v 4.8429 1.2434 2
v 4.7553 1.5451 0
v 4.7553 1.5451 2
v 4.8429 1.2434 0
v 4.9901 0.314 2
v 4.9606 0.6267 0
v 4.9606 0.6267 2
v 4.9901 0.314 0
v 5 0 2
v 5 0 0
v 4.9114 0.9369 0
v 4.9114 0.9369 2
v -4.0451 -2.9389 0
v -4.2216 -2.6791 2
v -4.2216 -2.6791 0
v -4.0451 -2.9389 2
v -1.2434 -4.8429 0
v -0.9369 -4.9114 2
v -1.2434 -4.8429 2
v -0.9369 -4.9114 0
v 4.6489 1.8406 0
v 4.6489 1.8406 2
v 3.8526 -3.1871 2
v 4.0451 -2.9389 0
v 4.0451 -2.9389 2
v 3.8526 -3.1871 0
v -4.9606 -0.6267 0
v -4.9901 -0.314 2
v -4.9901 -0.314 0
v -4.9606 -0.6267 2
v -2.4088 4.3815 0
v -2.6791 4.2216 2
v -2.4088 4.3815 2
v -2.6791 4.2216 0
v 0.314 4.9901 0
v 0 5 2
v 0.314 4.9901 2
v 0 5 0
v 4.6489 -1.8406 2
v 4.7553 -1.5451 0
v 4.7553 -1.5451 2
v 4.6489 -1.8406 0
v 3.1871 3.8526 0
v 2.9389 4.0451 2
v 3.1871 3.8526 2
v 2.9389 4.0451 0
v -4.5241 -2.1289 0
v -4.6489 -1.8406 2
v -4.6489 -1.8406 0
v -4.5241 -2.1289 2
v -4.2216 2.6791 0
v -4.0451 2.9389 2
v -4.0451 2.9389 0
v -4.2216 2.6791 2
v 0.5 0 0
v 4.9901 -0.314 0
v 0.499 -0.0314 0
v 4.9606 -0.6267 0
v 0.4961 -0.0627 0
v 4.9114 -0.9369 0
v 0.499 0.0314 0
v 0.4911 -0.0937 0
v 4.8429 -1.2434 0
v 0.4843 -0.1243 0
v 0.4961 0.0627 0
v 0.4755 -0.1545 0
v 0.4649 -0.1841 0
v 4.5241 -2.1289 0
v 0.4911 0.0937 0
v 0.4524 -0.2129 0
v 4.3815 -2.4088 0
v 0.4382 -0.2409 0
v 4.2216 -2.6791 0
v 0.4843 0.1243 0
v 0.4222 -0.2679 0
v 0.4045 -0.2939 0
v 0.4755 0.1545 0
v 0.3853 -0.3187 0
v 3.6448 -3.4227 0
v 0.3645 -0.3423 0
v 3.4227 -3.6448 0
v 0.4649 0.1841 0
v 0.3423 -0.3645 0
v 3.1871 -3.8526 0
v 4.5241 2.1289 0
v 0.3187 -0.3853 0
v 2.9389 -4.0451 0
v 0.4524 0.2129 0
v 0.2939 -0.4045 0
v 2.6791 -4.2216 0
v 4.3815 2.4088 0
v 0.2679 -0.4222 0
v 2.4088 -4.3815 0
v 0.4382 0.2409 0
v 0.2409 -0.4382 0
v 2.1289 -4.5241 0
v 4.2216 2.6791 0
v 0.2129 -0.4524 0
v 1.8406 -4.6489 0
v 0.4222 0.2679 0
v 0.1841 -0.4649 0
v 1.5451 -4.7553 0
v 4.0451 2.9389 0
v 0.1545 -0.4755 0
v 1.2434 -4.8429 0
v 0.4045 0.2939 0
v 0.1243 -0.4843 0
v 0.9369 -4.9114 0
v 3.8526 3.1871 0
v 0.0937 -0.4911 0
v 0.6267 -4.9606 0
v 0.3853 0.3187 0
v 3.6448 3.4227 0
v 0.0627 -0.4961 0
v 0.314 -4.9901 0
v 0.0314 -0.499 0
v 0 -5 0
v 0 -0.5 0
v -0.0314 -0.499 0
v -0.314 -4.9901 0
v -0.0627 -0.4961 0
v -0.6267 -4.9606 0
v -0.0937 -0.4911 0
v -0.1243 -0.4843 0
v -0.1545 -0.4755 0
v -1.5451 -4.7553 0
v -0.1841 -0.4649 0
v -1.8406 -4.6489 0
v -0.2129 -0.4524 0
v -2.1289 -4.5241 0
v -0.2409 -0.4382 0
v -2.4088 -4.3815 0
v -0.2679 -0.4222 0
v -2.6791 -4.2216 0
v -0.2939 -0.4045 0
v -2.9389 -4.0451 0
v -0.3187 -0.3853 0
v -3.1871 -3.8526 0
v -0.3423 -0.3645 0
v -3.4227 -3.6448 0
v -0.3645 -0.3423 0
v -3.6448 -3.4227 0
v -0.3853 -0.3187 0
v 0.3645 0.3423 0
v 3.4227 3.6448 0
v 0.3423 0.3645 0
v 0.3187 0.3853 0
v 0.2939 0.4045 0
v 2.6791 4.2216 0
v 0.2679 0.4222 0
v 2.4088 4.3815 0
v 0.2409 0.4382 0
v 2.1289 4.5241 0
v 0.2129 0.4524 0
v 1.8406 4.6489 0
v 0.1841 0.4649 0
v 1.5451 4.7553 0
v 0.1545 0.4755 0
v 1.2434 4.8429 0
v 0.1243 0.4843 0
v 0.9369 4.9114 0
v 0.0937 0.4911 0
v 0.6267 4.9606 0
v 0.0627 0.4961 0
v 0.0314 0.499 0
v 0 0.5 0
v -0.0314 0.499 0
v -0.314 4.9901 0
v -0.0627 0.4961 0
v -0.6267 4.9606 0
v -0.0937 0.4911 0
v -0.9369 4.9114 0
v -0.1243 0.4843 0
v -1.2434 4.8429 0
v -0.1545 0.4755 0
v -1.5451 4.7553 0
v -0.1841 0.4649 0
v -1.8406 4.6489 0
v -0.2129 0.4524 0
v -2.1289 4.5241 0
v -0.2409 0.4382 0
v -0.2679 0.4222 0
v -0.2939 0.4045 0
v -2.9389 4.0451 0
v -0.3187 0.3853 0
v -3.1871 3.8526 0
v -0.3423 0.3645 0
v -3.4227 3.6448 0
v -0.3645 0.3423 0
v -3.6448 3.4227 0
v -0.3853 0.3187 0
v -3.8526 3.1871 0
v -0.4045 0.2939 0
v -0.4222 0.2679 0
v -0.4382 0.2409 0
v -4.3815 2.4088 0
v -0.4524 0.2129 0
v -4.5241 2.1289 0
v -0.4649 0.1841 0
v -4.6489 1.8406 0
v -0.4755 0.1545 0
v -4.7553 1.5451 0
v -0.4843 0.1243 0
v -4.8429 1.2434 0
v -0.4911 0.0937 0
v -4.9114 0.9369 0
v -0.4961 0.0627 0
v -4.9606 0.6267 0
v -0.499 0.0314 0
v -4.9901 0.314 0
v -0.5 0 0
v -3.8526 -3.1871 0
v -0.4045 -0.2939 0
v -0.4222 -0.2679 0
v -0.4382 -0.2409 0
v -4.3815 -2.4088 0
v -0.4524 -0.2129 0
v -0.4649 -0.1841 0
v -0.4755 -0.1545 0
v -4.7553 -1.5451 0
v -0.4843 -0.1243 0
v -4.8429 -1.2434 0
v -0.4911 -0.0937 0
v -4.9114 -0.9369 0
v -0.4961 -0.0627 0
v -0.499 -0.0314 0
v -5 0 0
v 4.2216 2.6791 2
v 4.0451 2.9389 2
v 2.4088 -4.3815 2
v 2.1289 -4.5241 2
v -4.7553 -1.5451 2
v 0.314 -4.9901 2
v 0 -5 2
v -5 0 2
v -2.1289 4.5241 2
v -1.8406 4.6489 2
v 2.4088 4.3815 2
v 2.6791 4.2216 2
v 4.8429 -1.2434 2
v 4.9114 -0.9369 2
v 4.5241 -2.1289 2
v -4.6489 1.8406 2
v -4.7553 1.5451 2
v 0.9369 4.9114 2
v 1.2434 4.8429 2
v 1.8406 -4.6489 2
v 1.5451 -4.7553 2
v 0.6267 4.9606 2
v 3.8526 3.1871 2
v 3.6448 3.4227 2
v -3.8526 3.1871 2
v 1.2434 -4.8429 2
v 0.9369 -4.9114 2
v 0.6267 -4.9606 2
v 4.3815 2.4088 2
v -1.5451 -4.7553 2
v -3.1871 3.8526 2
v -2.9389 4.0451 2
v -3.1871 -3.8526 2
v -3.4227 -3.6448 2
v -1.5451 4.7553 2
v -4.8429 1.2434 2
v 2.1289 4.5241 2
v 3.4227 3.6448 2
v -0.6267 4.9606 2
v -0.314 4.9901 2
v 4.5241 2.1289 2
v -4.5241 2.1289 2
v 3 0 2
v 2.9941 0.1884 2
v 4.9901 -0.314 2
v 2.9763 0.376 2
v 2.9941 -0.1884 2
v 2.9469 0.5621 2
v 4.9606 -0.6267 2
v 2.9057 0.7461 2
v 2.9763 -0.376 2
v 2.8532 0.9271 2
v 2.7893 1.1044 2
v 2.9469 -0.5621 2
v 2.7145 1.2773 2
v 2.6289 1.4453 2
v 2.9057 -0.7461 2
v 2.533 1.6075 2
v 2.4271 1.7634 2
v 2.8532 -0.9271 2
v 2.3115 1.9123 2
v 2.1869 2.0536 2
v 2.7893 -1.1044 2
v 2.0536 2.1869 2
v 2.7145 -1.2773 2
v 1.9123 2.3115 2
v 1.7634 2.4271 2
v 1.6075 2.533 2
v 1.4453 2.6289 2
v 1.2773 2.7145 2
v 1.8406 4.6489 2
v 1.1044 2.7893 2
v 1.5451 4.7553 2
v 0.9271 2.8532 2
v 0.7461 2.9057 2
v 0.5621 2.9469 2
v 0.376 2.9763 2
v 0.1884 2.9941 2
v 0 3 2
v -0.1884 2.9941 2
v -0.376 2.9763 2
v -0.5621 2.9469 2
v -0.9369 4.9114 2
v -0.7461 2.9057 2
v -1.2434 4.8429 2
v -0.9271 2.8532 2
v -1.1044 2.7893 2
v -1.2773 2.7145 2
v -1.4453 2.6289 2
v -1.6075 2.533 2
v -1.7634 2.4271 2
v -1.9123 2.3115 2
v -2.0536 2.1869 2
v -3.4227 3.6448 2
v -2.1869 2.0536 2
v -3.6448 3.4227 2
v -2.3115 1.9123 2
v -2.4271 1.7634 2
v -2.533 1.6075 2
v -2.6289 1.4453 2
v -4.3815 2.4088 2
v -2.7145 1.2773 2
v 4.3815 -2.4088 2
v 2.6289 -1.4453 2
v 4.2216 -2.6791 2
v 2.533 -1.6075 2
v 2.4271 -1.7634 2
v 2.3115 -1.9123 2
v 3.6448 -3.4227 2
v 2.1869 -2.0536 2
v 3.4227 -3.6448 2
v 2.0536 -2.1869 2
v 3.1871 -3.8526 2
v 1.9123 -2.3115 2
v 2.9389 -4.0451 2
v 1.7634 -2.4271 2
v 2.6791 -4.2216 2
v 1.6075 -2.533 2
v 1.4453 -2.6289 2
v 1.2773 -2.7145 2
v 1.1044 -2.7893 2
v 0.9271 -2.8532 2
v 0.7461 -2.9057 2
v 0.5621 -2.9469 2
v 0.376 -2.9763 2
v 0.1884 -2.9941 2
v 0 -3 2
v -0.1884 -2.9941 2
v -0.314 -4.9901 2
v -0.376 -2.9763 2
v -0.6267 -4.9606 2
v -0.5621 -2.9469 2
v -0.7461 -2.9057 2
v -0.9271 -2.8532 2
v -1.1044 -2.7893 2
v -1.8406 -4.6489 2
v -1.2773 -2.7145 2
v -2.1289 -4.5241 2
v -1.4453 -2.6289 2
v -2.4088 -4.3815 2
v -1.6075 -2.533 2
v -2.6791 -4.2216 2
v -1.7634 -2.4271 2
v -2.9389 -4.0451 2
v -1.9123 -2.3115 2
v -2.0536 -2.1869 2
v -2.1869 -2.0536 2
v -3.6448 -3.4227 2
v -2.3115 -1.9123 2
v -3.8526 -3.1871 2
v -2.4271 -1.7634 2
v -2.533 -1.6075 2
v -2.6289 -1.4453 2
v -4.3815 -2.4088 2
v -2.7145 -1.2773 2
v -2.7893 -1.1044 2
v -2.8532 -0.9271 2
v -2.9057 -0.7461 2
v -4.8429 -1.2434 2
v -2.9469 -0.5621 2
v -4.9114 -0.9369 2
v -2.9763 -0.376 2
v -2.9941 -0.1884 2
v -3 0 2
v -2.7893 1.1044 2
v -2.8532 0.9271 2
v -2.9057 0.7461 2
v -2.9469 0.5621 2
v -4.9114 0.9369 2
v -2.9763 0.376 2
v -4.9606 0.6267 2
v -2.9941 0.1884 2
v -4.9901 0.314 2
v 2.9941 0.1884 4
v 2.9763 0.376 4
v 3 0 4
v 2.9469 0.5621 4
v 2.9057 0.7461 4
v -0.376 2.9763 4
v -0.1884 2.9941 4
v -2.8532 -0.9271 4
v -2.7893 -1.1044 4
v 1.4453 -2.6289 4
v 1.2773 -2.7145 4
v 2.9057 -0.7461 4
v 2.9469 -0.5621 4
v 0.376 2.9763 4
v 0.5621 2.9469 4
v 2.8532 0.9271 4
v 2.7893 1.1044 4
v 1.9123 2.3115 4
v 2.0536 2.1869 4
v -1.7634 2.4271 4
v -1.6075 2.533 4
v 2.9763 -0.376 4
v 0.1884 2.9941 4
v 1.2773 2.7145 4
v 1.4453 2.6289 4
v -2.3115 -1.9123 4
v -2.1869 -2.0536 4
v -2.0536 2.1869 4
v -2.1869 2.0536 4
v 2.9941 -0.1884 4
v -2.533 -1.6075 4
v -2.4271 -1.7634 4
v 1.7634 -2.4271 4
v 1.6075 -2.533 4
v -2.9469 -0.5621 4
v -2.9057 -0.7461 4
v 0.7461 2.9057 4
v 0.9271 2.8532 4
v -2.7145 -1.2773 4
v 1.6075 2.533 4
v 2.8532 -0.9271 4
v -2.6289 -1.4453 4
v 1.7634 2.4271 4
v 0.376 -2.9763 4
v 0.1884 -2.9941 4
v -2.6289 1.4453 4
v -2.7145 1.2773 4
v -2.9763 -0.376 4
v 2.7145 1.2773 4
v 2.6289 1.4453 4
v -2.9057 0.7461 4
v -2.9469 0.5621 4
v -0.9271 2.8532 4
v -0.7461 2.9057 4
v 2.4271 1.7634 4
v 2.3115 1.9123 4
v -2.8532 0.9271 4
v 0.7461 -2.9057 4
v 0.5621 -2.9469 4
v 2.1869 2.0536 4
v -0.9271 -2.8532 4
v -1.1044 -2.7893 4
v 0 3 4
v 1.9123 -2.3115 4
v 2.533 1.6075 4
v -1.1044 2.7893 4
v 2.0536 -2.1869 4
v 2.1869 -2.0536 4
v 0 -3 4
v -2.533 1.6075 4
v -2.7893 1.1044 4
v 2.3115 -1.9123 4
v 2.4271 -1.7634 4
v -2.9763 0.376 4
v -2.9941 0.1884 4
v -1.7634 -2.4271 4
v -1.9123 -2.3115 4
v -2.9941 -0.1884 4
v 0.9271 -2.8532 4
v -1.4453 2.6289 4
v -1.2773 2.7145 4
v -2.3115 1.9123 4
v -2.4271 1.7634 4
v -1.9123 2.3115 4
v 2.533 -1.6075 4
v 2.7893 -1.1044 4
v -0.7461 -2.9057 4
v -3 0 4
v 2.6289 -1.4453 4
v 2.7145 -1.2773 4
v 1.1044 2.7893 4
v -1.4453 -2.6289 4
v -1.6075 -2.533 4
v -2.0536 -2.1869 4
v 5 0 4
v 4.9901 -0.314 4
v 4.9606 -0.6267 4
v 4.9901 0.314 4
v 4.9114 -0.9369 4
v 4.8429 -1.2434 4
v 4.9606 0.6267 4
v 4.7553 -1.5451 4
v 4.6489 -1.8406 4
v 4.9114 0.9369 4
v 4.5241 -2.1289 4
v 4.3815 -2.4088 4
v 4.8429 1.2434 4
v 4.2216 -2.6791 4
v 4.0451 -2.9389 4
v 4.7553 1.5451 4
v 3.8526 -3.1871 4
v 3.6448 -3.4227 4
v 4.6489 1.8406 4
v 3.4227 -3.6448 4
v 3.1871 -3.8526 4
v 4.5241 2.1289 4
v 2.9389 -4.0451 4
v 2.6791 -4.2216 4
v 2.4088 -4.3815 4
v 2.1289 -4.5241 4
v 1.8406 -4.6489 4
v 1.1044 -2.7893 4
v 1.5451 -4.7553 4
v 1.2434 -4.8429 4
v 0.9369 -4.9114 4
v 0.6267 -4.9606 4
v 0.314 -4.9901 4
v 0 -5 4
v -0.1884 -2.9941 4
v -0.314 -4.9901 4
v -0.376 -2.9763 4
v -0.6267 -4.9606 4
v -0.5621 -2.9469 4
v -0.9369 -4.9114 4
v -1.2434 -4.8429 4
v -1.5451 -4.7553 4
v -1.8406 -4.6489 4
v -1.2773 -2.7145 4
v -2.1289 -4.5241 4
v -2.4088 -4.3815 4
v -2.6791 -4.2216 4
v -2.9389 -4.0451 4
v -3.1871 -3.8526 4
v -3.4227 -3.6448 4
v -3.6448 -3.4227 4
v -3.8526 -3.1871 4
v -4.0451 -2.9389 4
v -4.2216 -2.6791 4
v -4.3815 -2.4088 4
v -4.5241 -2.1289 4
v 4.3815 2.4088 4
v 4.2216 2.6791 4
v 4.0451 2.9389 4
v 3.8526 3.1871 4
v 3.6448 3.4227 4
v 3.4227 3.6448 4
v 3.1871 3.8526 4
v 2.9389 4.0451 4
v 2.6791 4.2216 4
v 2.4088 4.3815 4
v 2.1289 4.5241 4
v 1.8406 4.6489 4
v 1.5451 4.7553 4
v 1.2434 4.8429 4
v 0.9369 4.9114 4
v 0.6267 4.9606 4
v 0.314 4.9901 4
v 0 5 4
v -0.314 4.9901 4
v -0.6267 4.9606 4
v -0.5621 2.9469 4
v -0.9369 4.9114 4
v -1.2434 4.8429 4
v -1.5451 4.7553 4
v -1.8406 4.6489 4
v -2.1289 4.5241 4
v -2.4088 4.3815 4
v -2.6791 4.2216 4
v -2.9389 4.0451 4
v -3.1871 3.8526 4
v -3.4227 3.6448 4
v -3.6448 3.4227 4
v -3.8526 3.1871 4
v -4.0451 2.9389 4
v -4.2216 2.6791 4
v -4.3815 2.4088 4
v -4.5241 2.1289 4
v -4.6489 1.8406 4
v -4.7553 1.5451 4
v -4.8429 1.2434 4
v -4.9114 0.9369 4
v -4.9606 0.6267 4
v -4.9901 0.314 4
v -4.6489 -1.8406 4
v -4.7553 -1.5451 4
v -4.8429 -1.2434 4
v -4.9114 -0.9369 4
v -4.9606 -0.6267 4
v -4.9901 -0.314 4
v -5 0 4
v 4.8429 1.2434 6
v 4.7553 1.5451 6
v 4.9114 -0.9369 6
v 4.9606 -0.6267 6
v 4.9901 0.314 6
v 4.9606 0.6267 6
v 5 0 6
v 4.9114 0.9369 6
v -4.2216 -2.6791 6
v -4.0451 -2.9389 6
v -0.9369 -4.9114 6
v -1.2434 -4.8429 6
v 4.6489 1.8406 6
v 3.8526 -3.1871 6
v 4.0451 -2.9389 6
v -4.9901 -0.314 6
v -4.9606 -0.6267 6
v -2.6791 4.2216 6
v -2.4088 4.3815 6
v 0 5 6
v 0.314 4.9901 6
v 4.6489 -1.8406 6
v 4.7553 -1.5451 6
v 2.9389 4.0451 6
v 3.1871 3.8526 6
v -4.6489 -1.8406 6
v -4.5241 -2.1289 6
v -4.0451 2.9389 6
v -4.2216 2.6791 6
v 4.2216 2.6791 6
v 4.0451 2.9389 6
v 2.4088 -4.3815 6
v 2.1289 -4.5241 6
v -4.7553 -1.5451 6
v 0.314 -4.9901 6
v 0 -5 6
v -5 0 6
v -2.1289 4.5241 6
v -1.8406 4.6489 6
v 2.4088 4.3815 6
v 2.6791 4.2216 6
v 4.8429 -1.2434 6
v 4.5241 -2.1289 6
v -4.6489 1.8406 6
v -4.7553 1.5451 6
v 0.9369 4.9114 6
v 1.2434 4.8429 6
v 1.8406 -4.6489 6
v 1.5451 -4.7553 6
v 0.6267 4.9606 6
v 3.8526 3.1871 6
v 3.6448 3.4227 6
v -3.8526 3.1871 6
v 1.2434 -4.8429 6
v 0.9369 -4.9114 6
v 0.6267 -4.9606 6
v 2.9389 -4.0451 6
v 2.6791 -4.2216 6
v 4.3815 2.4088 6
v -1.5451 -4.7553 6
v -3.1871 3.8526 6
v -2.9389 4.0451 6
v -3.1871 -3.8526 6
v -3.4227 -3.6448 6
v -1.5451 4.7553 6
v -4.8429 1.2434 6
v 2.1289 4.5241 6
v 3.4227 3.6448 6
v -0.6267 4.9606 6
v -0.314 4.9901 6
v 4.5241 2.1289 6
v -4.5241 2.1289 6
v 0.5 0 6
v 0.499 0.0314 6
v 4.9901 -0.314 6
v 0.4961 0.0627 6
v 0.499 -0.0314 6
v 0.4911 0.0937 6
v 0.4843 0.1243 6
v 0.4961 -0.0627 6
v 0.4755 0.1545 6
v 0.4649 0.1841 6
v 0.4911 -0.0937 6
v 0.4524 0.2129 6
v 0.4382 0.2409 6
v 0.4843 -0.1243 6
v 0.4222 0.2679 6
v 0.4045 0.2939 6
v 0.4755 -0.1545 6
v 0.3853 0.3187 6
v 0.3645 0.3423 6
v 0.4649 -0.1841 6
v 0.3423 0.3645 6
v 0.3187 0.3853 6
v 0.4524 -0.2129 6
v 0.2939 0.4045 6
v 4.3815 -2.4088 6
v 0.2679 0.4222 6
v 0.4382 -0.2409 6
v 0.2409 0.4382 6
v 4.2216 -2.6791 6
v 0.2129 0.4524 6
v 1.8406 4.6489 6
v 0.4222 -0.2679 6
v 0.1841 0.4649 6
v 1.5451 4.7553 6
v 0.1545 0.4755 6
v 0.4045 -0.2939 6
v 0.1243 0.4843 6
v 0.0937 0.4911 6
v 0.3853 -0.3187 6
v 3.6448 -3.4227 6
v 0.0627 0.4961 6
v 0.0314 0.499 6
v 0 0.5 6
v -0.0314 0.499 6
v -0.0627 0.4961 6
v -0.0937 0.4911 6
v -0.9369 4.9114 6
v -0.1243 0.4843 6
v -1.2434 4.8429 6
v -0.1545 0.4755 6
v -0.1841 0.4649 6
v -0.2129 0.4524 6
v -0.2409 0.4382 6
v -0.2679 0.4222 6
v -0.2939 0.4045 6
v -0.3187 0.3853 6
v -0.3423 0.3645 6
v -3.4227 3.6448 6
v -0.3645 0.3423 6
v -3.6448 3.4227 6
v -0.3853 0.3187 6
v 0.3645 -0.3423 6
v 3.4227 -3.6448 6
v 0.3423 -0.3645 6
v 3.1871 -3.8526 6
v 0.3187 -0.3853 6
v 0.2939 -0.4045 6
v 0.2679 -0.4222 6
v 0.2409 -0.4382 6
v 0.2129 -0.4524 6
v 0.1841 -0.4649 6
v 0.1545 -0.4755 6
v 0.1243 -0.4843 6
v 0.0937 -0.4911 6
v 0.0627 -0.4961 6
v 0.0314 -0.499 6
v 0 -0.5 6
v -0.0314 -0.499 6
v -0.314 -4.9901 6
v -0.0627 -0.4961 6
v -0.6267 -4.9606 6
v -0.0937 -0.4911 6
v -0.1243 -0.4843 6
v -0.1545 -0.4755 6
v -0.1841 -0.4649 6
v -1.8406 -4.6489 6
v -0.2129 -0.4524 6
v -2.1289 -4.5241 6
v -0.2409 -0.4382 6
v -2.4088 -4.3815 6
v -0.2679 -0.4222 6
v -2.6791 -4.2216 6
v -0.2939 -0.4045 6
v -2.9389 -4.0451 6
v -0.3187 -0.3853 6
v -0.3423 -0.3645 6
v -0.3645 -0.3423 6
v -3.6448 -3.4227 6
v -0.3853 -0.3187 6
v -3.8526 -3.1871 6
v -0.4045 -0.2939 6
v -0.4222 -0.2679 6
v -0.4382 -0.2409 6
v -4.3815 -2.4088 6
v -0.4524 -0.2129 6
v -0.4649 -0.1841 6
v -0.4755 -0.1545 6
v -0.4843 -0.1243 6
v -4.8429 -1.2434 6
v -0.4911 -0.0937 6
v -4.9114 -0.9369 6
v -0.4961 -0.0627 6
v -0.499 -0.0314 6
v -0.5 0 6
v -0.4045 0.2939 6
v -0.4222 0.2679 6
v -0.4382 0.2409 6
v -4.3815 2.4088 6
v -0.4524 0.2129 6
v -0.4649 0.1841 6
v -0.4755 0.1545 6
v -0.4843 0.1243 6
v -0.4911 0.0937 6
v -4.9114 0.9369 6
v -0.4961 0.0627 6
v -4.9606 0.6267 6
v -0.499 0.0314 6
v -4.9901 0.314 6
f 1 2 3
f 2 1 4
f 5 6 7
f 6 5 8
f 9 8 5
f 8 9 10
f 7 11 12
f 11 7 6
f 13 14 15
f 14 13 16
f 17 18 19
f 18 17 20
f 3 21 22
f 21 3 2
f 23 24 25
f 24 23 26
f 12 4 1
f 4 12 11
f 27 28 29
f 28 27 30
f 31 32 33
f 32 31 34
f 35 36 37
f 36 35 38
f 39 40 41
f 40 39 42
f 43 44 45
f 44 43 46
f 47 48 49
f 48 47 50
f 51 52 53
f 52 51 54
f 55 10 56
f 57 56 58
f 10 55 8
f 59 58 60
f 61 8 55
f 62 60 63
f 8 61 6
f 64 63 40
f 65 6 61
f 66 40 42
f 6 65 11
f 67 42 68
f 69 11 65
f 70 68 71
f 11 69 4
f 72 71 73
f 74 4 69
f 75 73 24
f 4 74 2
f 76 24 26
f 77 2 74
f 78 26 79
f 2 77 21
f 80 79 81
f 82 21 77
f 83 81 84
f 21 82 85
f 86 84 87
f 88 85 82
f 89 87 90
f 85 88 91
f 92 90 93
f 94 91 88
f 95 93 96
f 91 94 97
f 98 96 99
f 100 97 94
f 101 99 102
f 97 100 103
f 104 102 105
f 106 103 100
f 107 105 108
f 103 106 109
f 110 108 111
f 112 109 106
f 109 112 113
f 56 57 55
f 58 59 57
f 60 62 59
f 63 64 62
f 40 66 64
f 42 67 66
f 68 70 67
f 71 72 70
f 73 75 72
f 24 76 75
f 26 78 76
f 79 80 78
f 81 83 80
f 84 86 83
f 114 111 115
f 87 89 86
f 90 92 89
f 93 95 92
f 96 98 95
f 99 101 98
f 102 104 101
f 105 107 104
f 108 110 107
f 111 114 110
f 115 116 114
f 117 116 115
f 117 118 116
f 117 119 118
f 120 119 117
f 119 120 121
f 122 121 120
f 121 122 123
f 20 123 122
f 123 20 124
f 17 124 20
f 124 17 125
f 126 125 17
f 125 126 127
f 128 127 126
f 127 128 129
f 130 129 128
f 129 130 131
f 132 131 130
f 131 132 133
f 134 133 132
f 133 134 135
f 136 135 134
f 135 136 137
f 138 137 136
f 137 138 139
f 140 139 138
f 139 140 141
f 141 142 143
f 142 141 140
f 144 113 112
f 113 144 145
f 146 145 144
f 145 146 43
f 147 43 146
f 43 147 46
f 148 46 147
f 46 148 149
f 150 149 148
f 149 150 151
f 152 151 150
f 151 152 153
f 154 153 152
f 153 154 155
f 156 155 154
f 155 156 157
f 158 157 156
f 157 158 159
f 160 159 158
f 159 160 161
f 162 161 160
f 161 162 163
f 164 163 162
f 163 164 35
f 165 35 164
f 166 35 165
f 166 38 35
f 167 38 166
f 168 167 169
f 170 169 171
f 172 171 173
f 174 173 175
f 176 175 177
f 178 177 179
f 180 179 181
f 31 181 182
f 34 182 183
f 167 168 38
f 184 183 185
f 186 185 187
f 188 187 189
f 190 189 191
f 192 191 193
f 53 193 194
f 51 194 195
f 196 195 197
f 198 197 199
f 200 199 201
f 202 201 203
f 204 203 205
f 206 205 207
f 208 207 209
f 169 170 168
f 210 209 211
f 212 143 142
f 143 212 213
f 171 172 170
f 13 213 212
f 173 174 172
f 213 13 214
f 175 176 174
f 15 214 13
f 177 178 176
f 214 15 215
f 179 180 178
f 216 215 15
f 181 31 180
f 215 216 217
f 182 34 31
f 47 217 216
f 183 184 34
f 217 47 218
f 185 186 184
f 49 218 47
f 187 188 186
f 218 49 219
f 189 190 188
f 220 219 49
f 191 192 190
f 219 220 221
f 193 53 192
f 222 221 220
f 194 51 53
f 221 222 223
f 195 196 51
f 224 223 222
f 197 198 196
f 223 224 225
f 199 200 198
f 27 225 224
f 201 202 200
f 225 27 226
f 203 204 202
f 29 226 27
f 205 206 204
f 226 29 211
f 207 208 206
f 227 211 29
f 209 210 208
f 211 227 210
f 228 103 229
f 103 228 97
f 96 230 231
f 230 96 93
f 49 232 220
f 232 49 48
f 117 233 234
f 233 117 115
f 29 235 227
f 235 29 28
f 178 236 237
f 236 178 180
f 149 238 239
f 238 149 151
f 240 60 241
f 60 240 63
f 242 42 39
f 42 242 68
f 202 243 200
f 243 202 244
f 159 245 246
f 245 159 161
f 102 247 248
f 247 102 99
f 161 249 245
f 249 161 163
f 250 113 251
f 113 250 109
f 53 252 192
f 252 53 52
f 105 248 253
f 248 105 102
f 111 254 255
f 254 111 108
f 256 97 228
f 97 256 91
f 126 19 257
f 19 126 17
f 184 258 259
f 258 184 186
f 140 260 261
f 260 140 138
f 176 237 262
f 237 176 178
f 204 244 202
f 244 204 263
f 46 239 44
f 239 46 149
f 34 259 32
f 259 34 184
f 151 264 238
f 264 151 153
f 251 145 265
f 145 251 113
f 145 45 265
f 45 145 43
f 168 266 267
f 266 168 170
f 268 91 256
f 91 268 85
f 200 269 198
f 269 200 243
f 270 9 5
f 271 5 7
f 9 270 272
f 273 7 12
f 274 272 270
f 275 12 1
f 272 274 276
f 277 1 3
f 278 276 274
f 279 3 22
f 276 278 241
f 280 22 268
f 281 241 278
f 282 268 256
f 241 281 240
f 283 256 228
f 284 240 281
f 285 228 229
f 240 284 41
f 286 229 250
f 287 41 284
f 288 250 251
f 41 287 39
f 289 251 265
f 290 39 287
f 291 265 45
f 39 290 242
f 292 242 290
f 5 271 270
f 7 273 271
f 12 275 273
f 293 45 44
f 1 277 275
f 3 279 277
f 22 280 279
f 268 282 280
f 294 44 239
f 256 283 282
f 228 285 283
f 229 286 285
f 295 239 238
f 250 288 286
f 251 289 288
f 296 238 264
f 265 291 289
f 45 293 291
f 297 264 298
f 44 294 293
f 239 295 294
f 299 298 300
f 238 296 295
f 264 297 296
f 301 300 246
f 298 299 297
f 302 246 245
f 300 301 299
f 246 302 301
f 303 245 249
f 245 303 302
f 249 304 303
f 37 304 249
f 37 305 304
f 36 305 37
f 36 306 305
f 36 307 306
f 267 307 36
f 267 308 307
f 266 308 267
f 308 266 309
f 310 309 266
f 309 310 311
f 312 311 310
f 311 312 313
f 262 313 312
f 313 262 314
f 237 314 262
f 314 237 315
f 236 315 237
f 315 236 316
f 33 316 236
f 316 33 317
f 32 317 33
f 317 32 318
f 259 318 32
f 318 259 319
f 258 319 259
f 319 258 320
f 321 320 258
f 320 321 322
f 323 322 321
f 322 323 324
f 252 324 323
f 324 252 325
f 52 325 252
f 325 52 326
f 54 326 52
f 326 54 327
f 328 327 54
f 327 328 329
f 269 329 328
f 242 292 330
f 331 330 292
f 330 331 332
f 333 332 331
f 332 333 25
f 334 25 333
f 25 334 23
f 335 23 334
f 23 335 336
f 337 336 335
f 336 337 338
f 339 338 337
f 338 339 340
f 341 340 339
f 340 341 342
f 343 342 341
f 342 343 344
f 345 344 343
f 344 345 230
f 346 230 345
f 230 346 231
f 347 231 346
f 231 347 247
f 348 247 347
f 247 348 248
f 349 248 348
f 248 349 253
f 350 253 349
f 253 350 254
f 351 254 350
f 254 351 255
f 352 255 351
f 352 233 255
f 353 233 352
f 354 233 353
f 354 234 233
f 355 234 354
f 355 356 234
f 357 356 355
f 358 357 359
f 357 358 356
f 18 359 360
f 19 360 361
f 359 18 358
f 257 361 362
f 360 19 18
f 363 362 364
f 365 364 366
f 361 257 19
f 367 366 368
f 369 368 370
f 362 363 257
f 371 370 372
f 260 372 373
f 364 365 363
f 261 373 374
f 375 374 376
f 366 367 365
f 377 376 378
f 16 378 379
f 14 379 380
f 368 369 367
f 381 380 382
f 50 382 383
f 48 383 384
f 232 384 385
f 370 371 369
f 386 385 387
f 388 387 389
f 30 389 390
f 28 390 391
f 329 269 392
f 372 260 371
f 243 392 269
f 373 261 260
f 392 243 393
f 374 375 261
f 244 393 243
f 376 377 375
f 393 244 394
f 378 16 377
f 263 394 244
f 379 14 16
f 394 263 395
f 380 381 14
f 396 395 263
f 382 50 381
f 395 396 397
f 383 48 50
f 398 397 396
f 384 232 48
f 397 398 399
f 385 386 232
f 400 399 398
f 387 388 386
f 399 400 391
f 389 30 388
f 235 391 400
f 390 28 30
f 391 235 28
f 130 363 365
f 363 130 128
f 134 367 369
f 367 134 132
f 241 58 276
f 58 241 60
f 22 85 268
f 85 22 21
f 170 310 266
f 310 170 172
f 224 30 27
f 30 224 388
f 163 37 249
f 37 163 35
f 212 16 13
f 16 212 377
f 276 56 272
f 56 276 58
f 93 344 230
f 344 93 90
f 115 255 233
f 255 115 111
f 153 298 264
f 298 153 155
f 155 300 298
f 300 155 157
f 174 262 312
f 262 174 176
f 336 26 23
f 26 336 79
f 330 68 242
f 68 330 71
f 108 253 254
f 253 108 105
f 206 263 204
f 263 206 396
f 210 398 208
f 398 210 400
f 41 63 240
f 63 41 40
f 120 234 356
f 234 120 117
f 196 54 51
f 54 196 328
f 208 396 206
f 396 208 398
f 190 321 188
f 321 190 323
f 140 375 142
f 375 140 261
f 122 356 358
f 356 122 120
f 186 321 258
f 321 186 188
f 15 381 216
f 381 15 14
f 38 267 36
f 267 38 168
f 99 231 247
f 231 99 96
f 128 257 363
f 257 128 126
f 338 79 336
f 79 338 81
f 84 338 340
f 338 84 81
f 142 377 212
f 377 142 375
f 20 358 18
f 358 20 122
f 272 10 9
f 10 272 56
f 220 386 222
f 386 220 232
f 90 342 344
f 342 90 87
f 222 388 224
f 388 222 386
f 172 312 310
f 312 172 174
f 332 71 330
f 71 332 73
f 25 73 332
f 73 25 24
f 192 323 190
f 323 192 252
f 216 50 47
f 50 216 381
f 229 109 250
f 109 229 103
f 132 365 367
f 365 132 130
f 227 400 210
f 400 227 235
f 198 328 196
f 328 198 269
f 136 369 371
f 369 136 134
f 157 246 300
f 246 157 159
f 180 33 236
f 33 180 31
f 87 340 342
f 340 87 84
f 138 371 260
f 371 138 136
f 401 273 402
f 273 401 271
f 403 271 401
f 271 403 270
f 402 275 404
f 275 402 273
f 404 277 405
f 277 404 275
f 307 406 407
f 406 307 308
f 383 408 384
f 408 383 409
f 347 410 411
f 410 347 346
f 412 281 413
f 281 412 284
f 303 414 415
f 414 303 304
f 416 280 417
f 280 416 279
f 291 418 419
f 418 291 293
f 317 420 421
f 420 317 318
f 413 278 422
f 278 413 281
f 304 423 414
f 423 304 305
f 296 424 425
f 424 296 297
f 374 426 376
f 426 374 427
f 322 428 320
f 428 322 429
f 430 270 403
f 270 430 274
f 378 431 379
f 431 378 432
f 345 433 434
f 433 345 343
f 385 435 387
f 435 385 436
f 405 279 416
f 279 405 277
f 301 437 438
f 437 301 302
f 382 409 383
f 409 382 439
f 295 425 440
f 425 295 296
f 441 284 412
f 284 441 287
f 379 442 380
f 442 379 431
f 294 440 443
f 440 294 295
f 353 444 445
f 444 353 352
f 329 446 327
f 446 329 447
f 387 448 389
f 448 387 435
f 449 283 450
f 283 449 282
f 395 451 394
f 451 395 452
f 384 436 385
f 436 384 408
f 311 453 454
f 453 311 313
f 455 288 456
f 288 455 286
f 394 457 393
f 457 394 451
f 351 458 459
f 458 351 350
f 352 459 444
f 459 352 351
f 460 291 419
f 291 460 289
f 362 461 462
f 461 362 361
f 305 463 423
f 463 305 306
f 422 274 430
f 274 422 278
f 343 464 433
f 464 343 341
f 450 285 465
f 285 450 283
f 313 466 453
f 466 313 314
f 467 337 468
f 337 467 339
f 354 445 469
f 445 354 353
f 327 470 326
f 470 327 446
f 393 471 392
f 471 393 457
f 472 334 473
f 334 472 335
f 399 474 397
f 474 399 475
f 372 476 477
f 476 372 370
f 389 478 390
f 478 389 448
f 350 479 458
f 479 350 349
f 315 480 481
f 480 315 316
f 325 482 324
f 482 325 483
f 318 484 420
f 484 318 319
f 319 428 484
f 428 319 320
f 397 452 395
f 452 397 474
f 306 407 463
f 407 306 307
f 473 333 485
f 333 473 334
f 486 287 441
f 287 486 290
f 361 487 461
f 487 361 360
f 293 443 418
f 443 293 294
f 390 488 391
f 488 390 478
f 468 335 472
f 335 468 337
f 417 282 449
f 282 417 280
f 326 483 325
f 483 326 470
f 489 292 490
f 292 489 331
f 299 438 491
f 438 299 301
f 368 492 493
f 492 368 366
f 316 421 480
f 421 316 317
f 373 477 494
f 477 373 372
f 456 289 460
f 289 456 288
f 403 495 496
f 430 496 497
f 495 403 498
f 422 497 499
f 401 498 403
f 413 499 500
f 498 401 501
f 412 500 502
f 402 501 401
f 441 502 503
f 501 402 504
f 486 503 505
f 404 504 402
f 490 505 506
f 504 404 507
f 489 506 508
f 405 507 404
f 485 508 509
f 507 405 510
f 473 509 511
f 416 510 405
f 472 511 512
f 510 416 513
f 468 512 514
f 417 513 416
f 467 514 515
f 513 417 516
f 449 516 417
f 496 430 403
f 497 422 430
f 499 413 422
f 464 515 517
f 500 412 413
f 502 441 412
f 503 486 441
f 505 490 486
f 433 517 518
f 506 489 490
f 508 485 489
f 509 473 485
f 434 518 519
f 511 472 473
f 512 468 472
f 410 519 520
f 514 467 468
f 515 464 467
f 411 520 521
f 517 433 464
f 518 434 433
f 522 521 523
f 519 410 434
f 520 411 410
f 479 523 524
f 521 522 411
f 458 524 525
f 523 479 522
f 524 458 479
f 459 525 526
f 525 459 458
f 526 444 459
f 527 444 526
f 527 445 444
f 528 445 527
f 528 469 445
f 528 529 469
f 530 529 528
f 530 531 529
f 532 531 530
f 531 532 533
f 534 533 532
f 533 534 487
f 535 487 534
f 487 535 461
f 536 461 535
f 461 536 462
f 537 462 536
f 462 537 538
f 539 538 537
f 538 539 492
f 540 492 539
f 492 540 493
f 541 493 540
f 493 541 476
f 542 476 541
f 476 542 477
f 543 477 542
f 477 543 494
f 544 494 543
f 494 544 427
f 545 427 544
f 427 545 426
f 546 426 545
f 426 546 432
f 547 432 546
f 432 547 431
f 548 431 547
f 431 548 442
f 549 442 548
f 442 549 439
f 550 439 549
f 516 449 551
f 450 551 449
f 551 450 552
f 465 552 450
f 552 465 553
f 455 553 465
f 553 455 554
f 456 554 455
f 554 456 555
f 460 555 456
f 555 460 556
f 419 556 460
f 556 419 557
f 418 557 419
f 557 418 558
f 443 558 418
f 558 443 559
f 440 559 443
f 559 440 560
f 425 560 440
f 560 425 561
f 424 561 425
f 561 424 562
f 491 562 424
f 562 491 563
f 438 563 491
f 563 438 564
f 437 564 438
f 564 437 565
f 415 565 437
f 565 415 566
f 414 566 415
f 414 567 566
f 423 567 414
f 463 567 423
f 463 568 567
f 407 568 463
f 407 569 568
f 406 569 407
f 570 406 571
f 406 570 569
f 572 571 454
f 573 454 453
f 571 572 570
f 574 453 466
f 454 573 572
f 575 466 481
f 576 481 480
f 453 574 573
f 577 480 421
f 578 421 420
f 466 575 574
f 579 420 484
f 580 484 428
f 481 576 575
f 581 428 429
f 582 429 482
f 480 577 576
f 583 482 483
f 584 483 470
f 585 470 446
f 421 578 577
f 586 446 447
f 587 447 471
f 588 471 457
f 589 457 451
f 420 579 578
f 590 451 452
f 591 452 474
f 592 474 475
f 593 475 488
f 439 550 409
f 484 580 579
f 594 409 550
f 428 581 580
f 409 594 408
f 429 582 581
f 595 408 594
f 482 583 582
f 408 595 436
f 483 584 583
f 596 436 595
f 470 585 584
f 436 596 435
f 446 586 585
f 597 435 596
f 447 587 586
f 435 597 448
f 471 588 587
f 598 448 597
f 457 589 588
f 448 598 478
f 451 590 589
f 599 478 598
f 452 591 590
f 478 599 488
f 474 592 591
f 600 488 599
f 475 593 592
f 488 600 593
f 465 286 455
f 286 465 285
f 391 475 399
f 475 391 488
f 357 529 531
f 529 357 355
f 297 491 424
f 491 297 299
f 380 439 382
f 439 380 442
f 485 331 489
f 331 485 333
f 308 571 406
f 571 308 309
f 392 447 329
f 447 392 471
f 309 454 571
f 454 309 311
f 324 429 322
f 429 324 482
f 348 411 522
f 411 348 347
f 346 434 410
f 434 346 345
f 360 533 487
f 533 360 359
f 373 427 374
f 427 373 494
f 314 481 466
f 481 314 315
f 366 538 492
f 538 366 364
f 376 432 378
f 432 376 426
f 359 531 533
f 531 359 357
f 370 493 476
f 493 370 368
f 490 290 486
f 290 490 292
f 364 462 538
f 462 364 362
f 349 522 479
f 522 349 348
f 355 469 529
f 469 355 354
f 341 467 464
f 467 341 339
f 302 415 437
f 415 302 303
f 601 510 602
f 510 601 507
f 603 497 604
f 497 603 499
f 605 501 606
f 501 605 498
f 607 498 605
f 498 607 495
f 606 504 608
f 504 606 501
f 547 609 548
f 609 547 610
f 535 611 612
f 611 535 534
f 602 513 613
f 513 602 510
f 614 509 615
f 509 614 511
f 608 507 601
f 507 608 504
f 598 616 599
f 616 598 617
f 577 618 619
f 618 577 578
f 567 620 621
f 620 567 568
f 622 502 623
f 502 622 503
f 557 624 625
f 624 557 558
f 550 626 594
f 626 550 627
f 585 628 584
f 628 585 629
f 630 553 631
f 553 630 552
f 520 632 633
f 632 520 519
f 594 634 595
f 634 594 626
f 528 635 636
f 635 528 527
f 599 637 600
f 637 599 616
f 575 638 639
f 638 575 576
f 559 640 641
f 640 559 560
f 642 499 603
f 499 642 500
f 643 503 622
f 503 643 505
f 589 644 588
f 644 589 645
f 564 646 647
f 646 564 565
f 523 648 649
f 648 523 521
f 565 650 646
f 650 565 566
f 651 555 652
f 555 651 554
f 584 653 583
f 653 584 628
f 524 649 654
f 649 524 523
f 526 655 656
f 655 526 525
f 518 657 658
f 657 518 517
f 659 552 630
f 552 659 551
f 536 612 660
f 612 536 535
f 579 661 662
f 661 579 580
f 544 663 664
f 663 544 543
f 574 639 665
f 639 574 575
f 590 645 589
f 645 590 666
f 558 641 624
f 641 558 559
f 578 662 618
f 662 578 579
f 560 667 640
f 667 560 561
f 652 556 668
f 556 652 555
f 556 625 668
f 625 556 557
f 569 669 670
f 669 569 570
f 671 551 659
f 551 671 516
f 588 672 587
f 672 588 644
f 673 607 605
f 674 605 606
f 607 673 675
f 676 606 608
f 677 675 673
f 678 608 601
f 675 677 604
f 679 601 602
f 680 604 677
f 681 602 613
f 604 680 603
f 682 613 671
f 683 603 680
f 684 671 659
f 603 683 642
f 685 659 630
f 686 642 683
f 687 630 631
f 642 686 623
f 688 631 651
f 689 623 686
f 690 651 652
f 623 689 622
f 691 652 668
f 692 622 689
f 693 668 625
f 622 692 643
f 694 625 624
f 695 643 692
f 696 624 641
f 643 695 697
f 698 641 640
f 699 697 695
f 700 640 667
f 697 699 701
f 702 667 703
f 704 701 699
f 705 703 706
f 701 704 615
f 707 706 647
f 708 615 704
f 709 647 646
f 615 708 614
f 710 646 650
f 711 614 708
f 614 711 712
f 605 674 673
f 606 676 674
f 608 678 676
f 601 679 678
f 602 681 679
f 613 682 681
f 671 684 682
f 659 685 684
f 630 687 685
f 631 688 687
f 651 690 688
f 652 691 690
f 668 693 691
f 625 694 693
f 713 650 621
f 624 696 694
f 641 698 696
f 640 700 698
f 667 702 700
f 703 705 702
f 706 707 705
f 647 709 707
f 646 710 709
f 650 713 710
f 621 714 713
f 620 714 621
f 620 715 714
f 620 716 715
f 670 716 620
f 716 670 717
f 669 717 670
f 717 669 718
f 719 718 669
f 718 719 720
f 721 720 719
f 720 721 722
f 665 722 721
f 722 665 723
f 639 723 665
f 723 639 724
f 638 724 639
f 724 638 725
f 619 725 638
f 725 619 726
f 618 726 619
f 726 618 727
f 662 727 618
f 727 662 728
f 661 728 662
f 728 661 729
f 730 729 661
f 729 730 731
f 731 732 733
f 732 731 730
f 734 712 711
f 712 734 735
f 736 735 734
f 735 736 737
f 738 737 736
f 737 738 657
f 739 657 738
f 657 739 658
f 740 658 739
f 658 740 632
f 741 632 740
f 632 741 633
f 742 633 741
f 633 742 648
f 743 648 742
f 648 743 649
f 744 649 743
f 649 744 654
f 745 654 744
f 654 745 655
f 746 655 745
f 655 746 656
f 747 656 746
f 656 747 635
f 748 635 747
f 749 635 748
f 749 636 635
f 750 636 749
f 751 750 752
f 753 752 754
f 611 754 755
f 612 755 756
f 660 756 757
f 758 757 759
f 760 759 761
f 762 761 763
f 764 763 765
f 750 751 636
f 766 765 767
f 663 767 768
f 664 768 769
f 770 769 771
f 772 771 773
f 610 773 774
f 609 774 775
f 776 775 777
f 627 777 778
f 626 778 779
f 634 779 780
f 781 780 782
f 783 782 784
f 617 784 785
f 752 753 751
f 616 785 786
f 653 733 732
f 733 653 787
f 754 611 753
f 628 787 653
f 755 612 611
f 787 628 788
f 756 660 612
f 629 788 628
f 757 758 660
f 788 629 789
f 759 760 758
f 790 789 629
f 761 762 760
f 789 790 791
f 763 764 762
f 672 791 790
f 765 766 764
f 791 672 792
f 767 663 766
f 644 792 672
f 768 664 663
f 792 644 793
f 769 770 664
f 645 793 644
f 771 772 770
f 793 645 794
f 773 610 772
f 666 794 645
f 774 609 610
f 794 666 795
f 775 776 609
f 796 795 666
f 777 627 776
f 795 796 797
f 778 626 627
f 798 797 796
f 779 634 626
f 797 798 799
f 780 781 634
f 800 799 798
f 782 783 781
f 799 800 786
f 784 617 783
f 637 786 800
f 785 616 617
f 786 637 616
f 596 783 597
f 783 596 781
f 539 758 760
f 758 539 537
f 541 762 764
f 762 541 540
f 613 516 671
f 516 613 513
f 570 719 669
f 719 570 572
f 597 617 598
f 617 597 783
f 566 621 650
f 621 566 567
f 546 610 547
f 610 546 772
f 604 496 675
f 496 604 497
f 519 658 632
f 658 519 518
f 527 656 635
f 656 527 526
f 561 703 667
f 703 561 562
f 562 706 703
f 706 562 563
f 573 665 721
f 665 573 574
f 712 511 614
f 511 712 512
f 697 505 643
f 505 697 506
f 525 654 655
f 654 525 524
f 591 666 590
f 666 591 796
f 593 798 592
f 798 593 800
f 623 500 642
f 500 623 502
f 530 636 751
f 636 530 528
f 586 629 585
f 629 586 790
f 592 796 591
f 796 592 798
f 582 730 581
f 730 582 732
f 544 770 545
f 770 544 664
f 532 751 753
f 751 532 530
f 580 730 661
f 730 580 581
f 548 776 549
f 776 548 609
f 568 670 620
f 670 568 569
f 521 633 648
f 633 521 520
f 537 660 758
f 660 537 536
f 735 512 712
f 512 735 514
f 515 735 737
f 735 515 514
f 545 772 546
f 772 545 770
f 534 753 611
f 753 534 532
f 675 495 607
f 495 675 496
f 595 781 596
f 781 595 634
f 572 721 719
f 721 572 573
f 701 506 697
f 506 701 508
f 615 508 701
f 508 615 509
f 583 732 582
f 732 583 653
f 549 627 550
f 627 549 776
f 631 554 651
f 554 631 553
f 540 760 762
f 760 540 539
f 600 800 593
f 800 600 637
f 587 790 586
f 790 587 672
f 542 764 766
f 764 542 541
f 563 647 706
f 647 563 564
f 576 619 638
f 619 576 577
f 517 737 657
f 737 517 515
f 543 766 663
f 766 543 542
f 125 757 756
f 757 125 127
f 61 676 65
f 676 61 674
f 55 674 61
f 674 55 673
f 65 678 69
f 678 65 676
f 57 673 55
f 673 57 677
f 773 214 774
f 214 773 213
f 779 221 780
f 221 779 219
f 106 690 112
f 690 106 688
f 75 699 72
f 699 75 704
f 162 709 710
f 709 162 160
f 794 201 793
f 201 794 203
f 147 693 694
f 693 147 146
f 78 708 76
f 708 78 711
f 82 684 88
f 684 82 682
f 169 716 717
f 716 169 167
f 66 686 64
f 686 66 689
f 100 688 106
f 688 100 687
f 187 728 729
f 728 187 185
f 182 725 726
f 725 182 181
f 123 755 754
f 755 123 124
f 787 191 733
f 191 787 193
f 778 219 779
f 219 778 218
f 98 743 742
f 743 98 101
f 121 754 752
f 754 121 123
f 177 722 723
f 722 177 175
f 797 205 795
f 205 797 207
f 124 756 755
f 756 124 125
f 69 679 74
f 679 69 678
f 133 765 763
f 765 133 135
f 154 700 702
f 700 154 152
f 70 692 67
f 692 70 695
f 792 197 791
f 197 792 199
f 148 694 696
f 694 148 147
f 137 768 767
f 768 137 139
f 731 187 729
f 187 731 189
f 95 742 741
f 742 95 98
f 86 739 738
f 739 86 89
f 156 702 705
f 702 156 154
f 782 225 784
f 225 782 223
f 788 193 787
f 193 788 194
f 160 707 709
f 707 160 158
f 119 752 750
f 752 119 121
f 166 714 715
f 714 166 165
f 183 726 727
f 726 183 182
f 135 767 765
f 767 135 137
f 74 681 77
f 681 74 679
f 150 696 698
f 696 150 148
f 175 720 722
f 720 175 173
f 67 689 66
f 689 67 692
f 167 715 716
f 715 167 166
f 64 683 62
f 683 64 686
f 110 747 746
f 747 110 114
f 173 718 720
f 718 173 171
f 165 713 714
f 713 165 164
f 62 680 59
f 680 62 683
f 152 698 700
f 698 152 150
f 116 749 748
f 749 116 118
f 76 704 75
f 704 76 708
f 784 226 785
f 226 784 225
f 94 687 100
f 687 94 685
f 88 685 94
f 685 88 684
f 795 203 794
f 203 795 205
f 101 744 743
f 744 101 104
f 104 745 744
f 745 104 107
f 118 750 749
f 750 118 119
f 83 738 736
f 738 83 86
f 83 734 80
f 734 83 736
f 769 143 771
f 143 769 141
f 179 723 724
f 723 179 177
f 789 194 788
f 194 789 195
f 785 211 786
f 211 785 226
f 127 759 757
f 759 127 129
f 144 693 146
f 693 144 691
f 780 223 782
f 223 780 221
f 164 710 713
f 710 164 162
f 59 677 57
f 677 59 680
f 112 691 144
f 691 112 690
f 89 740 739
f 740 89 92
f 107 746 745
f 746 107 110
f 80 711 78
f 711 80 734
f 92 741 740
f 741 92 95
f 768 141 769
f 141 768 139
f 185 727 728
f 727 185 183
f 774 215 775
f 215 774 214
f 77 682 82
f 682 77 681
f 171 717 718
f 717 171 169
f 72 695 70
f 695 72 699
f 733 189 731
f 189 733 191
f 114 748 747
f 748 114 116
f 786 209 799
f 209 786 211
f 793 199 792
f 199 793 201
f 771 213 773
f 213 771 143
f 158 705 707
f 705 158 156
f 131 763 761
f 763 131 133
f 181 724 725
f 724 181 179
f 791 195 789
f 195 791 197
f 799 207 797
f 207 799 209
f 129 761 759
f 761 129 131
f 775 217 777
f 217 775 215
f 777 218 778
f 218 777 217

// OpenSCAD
$fn=100;

rubberBandHolder(5,0.5);
//rubberBandHolder(30,2);

module rubberBandHolder(radius,holdRadius){
	
	difference(){
		union() {

			cylinder(h=2, r=radius);
      
      translate([0,0,2]){
        cylinder(h=2, r=radius-2);
      }
      
      translate([0,0,4]){
        cylinder(h=2, r=radius);
      }
    } 
    
    cylinder(h=6, r=holdRadius);
    
  }
}
